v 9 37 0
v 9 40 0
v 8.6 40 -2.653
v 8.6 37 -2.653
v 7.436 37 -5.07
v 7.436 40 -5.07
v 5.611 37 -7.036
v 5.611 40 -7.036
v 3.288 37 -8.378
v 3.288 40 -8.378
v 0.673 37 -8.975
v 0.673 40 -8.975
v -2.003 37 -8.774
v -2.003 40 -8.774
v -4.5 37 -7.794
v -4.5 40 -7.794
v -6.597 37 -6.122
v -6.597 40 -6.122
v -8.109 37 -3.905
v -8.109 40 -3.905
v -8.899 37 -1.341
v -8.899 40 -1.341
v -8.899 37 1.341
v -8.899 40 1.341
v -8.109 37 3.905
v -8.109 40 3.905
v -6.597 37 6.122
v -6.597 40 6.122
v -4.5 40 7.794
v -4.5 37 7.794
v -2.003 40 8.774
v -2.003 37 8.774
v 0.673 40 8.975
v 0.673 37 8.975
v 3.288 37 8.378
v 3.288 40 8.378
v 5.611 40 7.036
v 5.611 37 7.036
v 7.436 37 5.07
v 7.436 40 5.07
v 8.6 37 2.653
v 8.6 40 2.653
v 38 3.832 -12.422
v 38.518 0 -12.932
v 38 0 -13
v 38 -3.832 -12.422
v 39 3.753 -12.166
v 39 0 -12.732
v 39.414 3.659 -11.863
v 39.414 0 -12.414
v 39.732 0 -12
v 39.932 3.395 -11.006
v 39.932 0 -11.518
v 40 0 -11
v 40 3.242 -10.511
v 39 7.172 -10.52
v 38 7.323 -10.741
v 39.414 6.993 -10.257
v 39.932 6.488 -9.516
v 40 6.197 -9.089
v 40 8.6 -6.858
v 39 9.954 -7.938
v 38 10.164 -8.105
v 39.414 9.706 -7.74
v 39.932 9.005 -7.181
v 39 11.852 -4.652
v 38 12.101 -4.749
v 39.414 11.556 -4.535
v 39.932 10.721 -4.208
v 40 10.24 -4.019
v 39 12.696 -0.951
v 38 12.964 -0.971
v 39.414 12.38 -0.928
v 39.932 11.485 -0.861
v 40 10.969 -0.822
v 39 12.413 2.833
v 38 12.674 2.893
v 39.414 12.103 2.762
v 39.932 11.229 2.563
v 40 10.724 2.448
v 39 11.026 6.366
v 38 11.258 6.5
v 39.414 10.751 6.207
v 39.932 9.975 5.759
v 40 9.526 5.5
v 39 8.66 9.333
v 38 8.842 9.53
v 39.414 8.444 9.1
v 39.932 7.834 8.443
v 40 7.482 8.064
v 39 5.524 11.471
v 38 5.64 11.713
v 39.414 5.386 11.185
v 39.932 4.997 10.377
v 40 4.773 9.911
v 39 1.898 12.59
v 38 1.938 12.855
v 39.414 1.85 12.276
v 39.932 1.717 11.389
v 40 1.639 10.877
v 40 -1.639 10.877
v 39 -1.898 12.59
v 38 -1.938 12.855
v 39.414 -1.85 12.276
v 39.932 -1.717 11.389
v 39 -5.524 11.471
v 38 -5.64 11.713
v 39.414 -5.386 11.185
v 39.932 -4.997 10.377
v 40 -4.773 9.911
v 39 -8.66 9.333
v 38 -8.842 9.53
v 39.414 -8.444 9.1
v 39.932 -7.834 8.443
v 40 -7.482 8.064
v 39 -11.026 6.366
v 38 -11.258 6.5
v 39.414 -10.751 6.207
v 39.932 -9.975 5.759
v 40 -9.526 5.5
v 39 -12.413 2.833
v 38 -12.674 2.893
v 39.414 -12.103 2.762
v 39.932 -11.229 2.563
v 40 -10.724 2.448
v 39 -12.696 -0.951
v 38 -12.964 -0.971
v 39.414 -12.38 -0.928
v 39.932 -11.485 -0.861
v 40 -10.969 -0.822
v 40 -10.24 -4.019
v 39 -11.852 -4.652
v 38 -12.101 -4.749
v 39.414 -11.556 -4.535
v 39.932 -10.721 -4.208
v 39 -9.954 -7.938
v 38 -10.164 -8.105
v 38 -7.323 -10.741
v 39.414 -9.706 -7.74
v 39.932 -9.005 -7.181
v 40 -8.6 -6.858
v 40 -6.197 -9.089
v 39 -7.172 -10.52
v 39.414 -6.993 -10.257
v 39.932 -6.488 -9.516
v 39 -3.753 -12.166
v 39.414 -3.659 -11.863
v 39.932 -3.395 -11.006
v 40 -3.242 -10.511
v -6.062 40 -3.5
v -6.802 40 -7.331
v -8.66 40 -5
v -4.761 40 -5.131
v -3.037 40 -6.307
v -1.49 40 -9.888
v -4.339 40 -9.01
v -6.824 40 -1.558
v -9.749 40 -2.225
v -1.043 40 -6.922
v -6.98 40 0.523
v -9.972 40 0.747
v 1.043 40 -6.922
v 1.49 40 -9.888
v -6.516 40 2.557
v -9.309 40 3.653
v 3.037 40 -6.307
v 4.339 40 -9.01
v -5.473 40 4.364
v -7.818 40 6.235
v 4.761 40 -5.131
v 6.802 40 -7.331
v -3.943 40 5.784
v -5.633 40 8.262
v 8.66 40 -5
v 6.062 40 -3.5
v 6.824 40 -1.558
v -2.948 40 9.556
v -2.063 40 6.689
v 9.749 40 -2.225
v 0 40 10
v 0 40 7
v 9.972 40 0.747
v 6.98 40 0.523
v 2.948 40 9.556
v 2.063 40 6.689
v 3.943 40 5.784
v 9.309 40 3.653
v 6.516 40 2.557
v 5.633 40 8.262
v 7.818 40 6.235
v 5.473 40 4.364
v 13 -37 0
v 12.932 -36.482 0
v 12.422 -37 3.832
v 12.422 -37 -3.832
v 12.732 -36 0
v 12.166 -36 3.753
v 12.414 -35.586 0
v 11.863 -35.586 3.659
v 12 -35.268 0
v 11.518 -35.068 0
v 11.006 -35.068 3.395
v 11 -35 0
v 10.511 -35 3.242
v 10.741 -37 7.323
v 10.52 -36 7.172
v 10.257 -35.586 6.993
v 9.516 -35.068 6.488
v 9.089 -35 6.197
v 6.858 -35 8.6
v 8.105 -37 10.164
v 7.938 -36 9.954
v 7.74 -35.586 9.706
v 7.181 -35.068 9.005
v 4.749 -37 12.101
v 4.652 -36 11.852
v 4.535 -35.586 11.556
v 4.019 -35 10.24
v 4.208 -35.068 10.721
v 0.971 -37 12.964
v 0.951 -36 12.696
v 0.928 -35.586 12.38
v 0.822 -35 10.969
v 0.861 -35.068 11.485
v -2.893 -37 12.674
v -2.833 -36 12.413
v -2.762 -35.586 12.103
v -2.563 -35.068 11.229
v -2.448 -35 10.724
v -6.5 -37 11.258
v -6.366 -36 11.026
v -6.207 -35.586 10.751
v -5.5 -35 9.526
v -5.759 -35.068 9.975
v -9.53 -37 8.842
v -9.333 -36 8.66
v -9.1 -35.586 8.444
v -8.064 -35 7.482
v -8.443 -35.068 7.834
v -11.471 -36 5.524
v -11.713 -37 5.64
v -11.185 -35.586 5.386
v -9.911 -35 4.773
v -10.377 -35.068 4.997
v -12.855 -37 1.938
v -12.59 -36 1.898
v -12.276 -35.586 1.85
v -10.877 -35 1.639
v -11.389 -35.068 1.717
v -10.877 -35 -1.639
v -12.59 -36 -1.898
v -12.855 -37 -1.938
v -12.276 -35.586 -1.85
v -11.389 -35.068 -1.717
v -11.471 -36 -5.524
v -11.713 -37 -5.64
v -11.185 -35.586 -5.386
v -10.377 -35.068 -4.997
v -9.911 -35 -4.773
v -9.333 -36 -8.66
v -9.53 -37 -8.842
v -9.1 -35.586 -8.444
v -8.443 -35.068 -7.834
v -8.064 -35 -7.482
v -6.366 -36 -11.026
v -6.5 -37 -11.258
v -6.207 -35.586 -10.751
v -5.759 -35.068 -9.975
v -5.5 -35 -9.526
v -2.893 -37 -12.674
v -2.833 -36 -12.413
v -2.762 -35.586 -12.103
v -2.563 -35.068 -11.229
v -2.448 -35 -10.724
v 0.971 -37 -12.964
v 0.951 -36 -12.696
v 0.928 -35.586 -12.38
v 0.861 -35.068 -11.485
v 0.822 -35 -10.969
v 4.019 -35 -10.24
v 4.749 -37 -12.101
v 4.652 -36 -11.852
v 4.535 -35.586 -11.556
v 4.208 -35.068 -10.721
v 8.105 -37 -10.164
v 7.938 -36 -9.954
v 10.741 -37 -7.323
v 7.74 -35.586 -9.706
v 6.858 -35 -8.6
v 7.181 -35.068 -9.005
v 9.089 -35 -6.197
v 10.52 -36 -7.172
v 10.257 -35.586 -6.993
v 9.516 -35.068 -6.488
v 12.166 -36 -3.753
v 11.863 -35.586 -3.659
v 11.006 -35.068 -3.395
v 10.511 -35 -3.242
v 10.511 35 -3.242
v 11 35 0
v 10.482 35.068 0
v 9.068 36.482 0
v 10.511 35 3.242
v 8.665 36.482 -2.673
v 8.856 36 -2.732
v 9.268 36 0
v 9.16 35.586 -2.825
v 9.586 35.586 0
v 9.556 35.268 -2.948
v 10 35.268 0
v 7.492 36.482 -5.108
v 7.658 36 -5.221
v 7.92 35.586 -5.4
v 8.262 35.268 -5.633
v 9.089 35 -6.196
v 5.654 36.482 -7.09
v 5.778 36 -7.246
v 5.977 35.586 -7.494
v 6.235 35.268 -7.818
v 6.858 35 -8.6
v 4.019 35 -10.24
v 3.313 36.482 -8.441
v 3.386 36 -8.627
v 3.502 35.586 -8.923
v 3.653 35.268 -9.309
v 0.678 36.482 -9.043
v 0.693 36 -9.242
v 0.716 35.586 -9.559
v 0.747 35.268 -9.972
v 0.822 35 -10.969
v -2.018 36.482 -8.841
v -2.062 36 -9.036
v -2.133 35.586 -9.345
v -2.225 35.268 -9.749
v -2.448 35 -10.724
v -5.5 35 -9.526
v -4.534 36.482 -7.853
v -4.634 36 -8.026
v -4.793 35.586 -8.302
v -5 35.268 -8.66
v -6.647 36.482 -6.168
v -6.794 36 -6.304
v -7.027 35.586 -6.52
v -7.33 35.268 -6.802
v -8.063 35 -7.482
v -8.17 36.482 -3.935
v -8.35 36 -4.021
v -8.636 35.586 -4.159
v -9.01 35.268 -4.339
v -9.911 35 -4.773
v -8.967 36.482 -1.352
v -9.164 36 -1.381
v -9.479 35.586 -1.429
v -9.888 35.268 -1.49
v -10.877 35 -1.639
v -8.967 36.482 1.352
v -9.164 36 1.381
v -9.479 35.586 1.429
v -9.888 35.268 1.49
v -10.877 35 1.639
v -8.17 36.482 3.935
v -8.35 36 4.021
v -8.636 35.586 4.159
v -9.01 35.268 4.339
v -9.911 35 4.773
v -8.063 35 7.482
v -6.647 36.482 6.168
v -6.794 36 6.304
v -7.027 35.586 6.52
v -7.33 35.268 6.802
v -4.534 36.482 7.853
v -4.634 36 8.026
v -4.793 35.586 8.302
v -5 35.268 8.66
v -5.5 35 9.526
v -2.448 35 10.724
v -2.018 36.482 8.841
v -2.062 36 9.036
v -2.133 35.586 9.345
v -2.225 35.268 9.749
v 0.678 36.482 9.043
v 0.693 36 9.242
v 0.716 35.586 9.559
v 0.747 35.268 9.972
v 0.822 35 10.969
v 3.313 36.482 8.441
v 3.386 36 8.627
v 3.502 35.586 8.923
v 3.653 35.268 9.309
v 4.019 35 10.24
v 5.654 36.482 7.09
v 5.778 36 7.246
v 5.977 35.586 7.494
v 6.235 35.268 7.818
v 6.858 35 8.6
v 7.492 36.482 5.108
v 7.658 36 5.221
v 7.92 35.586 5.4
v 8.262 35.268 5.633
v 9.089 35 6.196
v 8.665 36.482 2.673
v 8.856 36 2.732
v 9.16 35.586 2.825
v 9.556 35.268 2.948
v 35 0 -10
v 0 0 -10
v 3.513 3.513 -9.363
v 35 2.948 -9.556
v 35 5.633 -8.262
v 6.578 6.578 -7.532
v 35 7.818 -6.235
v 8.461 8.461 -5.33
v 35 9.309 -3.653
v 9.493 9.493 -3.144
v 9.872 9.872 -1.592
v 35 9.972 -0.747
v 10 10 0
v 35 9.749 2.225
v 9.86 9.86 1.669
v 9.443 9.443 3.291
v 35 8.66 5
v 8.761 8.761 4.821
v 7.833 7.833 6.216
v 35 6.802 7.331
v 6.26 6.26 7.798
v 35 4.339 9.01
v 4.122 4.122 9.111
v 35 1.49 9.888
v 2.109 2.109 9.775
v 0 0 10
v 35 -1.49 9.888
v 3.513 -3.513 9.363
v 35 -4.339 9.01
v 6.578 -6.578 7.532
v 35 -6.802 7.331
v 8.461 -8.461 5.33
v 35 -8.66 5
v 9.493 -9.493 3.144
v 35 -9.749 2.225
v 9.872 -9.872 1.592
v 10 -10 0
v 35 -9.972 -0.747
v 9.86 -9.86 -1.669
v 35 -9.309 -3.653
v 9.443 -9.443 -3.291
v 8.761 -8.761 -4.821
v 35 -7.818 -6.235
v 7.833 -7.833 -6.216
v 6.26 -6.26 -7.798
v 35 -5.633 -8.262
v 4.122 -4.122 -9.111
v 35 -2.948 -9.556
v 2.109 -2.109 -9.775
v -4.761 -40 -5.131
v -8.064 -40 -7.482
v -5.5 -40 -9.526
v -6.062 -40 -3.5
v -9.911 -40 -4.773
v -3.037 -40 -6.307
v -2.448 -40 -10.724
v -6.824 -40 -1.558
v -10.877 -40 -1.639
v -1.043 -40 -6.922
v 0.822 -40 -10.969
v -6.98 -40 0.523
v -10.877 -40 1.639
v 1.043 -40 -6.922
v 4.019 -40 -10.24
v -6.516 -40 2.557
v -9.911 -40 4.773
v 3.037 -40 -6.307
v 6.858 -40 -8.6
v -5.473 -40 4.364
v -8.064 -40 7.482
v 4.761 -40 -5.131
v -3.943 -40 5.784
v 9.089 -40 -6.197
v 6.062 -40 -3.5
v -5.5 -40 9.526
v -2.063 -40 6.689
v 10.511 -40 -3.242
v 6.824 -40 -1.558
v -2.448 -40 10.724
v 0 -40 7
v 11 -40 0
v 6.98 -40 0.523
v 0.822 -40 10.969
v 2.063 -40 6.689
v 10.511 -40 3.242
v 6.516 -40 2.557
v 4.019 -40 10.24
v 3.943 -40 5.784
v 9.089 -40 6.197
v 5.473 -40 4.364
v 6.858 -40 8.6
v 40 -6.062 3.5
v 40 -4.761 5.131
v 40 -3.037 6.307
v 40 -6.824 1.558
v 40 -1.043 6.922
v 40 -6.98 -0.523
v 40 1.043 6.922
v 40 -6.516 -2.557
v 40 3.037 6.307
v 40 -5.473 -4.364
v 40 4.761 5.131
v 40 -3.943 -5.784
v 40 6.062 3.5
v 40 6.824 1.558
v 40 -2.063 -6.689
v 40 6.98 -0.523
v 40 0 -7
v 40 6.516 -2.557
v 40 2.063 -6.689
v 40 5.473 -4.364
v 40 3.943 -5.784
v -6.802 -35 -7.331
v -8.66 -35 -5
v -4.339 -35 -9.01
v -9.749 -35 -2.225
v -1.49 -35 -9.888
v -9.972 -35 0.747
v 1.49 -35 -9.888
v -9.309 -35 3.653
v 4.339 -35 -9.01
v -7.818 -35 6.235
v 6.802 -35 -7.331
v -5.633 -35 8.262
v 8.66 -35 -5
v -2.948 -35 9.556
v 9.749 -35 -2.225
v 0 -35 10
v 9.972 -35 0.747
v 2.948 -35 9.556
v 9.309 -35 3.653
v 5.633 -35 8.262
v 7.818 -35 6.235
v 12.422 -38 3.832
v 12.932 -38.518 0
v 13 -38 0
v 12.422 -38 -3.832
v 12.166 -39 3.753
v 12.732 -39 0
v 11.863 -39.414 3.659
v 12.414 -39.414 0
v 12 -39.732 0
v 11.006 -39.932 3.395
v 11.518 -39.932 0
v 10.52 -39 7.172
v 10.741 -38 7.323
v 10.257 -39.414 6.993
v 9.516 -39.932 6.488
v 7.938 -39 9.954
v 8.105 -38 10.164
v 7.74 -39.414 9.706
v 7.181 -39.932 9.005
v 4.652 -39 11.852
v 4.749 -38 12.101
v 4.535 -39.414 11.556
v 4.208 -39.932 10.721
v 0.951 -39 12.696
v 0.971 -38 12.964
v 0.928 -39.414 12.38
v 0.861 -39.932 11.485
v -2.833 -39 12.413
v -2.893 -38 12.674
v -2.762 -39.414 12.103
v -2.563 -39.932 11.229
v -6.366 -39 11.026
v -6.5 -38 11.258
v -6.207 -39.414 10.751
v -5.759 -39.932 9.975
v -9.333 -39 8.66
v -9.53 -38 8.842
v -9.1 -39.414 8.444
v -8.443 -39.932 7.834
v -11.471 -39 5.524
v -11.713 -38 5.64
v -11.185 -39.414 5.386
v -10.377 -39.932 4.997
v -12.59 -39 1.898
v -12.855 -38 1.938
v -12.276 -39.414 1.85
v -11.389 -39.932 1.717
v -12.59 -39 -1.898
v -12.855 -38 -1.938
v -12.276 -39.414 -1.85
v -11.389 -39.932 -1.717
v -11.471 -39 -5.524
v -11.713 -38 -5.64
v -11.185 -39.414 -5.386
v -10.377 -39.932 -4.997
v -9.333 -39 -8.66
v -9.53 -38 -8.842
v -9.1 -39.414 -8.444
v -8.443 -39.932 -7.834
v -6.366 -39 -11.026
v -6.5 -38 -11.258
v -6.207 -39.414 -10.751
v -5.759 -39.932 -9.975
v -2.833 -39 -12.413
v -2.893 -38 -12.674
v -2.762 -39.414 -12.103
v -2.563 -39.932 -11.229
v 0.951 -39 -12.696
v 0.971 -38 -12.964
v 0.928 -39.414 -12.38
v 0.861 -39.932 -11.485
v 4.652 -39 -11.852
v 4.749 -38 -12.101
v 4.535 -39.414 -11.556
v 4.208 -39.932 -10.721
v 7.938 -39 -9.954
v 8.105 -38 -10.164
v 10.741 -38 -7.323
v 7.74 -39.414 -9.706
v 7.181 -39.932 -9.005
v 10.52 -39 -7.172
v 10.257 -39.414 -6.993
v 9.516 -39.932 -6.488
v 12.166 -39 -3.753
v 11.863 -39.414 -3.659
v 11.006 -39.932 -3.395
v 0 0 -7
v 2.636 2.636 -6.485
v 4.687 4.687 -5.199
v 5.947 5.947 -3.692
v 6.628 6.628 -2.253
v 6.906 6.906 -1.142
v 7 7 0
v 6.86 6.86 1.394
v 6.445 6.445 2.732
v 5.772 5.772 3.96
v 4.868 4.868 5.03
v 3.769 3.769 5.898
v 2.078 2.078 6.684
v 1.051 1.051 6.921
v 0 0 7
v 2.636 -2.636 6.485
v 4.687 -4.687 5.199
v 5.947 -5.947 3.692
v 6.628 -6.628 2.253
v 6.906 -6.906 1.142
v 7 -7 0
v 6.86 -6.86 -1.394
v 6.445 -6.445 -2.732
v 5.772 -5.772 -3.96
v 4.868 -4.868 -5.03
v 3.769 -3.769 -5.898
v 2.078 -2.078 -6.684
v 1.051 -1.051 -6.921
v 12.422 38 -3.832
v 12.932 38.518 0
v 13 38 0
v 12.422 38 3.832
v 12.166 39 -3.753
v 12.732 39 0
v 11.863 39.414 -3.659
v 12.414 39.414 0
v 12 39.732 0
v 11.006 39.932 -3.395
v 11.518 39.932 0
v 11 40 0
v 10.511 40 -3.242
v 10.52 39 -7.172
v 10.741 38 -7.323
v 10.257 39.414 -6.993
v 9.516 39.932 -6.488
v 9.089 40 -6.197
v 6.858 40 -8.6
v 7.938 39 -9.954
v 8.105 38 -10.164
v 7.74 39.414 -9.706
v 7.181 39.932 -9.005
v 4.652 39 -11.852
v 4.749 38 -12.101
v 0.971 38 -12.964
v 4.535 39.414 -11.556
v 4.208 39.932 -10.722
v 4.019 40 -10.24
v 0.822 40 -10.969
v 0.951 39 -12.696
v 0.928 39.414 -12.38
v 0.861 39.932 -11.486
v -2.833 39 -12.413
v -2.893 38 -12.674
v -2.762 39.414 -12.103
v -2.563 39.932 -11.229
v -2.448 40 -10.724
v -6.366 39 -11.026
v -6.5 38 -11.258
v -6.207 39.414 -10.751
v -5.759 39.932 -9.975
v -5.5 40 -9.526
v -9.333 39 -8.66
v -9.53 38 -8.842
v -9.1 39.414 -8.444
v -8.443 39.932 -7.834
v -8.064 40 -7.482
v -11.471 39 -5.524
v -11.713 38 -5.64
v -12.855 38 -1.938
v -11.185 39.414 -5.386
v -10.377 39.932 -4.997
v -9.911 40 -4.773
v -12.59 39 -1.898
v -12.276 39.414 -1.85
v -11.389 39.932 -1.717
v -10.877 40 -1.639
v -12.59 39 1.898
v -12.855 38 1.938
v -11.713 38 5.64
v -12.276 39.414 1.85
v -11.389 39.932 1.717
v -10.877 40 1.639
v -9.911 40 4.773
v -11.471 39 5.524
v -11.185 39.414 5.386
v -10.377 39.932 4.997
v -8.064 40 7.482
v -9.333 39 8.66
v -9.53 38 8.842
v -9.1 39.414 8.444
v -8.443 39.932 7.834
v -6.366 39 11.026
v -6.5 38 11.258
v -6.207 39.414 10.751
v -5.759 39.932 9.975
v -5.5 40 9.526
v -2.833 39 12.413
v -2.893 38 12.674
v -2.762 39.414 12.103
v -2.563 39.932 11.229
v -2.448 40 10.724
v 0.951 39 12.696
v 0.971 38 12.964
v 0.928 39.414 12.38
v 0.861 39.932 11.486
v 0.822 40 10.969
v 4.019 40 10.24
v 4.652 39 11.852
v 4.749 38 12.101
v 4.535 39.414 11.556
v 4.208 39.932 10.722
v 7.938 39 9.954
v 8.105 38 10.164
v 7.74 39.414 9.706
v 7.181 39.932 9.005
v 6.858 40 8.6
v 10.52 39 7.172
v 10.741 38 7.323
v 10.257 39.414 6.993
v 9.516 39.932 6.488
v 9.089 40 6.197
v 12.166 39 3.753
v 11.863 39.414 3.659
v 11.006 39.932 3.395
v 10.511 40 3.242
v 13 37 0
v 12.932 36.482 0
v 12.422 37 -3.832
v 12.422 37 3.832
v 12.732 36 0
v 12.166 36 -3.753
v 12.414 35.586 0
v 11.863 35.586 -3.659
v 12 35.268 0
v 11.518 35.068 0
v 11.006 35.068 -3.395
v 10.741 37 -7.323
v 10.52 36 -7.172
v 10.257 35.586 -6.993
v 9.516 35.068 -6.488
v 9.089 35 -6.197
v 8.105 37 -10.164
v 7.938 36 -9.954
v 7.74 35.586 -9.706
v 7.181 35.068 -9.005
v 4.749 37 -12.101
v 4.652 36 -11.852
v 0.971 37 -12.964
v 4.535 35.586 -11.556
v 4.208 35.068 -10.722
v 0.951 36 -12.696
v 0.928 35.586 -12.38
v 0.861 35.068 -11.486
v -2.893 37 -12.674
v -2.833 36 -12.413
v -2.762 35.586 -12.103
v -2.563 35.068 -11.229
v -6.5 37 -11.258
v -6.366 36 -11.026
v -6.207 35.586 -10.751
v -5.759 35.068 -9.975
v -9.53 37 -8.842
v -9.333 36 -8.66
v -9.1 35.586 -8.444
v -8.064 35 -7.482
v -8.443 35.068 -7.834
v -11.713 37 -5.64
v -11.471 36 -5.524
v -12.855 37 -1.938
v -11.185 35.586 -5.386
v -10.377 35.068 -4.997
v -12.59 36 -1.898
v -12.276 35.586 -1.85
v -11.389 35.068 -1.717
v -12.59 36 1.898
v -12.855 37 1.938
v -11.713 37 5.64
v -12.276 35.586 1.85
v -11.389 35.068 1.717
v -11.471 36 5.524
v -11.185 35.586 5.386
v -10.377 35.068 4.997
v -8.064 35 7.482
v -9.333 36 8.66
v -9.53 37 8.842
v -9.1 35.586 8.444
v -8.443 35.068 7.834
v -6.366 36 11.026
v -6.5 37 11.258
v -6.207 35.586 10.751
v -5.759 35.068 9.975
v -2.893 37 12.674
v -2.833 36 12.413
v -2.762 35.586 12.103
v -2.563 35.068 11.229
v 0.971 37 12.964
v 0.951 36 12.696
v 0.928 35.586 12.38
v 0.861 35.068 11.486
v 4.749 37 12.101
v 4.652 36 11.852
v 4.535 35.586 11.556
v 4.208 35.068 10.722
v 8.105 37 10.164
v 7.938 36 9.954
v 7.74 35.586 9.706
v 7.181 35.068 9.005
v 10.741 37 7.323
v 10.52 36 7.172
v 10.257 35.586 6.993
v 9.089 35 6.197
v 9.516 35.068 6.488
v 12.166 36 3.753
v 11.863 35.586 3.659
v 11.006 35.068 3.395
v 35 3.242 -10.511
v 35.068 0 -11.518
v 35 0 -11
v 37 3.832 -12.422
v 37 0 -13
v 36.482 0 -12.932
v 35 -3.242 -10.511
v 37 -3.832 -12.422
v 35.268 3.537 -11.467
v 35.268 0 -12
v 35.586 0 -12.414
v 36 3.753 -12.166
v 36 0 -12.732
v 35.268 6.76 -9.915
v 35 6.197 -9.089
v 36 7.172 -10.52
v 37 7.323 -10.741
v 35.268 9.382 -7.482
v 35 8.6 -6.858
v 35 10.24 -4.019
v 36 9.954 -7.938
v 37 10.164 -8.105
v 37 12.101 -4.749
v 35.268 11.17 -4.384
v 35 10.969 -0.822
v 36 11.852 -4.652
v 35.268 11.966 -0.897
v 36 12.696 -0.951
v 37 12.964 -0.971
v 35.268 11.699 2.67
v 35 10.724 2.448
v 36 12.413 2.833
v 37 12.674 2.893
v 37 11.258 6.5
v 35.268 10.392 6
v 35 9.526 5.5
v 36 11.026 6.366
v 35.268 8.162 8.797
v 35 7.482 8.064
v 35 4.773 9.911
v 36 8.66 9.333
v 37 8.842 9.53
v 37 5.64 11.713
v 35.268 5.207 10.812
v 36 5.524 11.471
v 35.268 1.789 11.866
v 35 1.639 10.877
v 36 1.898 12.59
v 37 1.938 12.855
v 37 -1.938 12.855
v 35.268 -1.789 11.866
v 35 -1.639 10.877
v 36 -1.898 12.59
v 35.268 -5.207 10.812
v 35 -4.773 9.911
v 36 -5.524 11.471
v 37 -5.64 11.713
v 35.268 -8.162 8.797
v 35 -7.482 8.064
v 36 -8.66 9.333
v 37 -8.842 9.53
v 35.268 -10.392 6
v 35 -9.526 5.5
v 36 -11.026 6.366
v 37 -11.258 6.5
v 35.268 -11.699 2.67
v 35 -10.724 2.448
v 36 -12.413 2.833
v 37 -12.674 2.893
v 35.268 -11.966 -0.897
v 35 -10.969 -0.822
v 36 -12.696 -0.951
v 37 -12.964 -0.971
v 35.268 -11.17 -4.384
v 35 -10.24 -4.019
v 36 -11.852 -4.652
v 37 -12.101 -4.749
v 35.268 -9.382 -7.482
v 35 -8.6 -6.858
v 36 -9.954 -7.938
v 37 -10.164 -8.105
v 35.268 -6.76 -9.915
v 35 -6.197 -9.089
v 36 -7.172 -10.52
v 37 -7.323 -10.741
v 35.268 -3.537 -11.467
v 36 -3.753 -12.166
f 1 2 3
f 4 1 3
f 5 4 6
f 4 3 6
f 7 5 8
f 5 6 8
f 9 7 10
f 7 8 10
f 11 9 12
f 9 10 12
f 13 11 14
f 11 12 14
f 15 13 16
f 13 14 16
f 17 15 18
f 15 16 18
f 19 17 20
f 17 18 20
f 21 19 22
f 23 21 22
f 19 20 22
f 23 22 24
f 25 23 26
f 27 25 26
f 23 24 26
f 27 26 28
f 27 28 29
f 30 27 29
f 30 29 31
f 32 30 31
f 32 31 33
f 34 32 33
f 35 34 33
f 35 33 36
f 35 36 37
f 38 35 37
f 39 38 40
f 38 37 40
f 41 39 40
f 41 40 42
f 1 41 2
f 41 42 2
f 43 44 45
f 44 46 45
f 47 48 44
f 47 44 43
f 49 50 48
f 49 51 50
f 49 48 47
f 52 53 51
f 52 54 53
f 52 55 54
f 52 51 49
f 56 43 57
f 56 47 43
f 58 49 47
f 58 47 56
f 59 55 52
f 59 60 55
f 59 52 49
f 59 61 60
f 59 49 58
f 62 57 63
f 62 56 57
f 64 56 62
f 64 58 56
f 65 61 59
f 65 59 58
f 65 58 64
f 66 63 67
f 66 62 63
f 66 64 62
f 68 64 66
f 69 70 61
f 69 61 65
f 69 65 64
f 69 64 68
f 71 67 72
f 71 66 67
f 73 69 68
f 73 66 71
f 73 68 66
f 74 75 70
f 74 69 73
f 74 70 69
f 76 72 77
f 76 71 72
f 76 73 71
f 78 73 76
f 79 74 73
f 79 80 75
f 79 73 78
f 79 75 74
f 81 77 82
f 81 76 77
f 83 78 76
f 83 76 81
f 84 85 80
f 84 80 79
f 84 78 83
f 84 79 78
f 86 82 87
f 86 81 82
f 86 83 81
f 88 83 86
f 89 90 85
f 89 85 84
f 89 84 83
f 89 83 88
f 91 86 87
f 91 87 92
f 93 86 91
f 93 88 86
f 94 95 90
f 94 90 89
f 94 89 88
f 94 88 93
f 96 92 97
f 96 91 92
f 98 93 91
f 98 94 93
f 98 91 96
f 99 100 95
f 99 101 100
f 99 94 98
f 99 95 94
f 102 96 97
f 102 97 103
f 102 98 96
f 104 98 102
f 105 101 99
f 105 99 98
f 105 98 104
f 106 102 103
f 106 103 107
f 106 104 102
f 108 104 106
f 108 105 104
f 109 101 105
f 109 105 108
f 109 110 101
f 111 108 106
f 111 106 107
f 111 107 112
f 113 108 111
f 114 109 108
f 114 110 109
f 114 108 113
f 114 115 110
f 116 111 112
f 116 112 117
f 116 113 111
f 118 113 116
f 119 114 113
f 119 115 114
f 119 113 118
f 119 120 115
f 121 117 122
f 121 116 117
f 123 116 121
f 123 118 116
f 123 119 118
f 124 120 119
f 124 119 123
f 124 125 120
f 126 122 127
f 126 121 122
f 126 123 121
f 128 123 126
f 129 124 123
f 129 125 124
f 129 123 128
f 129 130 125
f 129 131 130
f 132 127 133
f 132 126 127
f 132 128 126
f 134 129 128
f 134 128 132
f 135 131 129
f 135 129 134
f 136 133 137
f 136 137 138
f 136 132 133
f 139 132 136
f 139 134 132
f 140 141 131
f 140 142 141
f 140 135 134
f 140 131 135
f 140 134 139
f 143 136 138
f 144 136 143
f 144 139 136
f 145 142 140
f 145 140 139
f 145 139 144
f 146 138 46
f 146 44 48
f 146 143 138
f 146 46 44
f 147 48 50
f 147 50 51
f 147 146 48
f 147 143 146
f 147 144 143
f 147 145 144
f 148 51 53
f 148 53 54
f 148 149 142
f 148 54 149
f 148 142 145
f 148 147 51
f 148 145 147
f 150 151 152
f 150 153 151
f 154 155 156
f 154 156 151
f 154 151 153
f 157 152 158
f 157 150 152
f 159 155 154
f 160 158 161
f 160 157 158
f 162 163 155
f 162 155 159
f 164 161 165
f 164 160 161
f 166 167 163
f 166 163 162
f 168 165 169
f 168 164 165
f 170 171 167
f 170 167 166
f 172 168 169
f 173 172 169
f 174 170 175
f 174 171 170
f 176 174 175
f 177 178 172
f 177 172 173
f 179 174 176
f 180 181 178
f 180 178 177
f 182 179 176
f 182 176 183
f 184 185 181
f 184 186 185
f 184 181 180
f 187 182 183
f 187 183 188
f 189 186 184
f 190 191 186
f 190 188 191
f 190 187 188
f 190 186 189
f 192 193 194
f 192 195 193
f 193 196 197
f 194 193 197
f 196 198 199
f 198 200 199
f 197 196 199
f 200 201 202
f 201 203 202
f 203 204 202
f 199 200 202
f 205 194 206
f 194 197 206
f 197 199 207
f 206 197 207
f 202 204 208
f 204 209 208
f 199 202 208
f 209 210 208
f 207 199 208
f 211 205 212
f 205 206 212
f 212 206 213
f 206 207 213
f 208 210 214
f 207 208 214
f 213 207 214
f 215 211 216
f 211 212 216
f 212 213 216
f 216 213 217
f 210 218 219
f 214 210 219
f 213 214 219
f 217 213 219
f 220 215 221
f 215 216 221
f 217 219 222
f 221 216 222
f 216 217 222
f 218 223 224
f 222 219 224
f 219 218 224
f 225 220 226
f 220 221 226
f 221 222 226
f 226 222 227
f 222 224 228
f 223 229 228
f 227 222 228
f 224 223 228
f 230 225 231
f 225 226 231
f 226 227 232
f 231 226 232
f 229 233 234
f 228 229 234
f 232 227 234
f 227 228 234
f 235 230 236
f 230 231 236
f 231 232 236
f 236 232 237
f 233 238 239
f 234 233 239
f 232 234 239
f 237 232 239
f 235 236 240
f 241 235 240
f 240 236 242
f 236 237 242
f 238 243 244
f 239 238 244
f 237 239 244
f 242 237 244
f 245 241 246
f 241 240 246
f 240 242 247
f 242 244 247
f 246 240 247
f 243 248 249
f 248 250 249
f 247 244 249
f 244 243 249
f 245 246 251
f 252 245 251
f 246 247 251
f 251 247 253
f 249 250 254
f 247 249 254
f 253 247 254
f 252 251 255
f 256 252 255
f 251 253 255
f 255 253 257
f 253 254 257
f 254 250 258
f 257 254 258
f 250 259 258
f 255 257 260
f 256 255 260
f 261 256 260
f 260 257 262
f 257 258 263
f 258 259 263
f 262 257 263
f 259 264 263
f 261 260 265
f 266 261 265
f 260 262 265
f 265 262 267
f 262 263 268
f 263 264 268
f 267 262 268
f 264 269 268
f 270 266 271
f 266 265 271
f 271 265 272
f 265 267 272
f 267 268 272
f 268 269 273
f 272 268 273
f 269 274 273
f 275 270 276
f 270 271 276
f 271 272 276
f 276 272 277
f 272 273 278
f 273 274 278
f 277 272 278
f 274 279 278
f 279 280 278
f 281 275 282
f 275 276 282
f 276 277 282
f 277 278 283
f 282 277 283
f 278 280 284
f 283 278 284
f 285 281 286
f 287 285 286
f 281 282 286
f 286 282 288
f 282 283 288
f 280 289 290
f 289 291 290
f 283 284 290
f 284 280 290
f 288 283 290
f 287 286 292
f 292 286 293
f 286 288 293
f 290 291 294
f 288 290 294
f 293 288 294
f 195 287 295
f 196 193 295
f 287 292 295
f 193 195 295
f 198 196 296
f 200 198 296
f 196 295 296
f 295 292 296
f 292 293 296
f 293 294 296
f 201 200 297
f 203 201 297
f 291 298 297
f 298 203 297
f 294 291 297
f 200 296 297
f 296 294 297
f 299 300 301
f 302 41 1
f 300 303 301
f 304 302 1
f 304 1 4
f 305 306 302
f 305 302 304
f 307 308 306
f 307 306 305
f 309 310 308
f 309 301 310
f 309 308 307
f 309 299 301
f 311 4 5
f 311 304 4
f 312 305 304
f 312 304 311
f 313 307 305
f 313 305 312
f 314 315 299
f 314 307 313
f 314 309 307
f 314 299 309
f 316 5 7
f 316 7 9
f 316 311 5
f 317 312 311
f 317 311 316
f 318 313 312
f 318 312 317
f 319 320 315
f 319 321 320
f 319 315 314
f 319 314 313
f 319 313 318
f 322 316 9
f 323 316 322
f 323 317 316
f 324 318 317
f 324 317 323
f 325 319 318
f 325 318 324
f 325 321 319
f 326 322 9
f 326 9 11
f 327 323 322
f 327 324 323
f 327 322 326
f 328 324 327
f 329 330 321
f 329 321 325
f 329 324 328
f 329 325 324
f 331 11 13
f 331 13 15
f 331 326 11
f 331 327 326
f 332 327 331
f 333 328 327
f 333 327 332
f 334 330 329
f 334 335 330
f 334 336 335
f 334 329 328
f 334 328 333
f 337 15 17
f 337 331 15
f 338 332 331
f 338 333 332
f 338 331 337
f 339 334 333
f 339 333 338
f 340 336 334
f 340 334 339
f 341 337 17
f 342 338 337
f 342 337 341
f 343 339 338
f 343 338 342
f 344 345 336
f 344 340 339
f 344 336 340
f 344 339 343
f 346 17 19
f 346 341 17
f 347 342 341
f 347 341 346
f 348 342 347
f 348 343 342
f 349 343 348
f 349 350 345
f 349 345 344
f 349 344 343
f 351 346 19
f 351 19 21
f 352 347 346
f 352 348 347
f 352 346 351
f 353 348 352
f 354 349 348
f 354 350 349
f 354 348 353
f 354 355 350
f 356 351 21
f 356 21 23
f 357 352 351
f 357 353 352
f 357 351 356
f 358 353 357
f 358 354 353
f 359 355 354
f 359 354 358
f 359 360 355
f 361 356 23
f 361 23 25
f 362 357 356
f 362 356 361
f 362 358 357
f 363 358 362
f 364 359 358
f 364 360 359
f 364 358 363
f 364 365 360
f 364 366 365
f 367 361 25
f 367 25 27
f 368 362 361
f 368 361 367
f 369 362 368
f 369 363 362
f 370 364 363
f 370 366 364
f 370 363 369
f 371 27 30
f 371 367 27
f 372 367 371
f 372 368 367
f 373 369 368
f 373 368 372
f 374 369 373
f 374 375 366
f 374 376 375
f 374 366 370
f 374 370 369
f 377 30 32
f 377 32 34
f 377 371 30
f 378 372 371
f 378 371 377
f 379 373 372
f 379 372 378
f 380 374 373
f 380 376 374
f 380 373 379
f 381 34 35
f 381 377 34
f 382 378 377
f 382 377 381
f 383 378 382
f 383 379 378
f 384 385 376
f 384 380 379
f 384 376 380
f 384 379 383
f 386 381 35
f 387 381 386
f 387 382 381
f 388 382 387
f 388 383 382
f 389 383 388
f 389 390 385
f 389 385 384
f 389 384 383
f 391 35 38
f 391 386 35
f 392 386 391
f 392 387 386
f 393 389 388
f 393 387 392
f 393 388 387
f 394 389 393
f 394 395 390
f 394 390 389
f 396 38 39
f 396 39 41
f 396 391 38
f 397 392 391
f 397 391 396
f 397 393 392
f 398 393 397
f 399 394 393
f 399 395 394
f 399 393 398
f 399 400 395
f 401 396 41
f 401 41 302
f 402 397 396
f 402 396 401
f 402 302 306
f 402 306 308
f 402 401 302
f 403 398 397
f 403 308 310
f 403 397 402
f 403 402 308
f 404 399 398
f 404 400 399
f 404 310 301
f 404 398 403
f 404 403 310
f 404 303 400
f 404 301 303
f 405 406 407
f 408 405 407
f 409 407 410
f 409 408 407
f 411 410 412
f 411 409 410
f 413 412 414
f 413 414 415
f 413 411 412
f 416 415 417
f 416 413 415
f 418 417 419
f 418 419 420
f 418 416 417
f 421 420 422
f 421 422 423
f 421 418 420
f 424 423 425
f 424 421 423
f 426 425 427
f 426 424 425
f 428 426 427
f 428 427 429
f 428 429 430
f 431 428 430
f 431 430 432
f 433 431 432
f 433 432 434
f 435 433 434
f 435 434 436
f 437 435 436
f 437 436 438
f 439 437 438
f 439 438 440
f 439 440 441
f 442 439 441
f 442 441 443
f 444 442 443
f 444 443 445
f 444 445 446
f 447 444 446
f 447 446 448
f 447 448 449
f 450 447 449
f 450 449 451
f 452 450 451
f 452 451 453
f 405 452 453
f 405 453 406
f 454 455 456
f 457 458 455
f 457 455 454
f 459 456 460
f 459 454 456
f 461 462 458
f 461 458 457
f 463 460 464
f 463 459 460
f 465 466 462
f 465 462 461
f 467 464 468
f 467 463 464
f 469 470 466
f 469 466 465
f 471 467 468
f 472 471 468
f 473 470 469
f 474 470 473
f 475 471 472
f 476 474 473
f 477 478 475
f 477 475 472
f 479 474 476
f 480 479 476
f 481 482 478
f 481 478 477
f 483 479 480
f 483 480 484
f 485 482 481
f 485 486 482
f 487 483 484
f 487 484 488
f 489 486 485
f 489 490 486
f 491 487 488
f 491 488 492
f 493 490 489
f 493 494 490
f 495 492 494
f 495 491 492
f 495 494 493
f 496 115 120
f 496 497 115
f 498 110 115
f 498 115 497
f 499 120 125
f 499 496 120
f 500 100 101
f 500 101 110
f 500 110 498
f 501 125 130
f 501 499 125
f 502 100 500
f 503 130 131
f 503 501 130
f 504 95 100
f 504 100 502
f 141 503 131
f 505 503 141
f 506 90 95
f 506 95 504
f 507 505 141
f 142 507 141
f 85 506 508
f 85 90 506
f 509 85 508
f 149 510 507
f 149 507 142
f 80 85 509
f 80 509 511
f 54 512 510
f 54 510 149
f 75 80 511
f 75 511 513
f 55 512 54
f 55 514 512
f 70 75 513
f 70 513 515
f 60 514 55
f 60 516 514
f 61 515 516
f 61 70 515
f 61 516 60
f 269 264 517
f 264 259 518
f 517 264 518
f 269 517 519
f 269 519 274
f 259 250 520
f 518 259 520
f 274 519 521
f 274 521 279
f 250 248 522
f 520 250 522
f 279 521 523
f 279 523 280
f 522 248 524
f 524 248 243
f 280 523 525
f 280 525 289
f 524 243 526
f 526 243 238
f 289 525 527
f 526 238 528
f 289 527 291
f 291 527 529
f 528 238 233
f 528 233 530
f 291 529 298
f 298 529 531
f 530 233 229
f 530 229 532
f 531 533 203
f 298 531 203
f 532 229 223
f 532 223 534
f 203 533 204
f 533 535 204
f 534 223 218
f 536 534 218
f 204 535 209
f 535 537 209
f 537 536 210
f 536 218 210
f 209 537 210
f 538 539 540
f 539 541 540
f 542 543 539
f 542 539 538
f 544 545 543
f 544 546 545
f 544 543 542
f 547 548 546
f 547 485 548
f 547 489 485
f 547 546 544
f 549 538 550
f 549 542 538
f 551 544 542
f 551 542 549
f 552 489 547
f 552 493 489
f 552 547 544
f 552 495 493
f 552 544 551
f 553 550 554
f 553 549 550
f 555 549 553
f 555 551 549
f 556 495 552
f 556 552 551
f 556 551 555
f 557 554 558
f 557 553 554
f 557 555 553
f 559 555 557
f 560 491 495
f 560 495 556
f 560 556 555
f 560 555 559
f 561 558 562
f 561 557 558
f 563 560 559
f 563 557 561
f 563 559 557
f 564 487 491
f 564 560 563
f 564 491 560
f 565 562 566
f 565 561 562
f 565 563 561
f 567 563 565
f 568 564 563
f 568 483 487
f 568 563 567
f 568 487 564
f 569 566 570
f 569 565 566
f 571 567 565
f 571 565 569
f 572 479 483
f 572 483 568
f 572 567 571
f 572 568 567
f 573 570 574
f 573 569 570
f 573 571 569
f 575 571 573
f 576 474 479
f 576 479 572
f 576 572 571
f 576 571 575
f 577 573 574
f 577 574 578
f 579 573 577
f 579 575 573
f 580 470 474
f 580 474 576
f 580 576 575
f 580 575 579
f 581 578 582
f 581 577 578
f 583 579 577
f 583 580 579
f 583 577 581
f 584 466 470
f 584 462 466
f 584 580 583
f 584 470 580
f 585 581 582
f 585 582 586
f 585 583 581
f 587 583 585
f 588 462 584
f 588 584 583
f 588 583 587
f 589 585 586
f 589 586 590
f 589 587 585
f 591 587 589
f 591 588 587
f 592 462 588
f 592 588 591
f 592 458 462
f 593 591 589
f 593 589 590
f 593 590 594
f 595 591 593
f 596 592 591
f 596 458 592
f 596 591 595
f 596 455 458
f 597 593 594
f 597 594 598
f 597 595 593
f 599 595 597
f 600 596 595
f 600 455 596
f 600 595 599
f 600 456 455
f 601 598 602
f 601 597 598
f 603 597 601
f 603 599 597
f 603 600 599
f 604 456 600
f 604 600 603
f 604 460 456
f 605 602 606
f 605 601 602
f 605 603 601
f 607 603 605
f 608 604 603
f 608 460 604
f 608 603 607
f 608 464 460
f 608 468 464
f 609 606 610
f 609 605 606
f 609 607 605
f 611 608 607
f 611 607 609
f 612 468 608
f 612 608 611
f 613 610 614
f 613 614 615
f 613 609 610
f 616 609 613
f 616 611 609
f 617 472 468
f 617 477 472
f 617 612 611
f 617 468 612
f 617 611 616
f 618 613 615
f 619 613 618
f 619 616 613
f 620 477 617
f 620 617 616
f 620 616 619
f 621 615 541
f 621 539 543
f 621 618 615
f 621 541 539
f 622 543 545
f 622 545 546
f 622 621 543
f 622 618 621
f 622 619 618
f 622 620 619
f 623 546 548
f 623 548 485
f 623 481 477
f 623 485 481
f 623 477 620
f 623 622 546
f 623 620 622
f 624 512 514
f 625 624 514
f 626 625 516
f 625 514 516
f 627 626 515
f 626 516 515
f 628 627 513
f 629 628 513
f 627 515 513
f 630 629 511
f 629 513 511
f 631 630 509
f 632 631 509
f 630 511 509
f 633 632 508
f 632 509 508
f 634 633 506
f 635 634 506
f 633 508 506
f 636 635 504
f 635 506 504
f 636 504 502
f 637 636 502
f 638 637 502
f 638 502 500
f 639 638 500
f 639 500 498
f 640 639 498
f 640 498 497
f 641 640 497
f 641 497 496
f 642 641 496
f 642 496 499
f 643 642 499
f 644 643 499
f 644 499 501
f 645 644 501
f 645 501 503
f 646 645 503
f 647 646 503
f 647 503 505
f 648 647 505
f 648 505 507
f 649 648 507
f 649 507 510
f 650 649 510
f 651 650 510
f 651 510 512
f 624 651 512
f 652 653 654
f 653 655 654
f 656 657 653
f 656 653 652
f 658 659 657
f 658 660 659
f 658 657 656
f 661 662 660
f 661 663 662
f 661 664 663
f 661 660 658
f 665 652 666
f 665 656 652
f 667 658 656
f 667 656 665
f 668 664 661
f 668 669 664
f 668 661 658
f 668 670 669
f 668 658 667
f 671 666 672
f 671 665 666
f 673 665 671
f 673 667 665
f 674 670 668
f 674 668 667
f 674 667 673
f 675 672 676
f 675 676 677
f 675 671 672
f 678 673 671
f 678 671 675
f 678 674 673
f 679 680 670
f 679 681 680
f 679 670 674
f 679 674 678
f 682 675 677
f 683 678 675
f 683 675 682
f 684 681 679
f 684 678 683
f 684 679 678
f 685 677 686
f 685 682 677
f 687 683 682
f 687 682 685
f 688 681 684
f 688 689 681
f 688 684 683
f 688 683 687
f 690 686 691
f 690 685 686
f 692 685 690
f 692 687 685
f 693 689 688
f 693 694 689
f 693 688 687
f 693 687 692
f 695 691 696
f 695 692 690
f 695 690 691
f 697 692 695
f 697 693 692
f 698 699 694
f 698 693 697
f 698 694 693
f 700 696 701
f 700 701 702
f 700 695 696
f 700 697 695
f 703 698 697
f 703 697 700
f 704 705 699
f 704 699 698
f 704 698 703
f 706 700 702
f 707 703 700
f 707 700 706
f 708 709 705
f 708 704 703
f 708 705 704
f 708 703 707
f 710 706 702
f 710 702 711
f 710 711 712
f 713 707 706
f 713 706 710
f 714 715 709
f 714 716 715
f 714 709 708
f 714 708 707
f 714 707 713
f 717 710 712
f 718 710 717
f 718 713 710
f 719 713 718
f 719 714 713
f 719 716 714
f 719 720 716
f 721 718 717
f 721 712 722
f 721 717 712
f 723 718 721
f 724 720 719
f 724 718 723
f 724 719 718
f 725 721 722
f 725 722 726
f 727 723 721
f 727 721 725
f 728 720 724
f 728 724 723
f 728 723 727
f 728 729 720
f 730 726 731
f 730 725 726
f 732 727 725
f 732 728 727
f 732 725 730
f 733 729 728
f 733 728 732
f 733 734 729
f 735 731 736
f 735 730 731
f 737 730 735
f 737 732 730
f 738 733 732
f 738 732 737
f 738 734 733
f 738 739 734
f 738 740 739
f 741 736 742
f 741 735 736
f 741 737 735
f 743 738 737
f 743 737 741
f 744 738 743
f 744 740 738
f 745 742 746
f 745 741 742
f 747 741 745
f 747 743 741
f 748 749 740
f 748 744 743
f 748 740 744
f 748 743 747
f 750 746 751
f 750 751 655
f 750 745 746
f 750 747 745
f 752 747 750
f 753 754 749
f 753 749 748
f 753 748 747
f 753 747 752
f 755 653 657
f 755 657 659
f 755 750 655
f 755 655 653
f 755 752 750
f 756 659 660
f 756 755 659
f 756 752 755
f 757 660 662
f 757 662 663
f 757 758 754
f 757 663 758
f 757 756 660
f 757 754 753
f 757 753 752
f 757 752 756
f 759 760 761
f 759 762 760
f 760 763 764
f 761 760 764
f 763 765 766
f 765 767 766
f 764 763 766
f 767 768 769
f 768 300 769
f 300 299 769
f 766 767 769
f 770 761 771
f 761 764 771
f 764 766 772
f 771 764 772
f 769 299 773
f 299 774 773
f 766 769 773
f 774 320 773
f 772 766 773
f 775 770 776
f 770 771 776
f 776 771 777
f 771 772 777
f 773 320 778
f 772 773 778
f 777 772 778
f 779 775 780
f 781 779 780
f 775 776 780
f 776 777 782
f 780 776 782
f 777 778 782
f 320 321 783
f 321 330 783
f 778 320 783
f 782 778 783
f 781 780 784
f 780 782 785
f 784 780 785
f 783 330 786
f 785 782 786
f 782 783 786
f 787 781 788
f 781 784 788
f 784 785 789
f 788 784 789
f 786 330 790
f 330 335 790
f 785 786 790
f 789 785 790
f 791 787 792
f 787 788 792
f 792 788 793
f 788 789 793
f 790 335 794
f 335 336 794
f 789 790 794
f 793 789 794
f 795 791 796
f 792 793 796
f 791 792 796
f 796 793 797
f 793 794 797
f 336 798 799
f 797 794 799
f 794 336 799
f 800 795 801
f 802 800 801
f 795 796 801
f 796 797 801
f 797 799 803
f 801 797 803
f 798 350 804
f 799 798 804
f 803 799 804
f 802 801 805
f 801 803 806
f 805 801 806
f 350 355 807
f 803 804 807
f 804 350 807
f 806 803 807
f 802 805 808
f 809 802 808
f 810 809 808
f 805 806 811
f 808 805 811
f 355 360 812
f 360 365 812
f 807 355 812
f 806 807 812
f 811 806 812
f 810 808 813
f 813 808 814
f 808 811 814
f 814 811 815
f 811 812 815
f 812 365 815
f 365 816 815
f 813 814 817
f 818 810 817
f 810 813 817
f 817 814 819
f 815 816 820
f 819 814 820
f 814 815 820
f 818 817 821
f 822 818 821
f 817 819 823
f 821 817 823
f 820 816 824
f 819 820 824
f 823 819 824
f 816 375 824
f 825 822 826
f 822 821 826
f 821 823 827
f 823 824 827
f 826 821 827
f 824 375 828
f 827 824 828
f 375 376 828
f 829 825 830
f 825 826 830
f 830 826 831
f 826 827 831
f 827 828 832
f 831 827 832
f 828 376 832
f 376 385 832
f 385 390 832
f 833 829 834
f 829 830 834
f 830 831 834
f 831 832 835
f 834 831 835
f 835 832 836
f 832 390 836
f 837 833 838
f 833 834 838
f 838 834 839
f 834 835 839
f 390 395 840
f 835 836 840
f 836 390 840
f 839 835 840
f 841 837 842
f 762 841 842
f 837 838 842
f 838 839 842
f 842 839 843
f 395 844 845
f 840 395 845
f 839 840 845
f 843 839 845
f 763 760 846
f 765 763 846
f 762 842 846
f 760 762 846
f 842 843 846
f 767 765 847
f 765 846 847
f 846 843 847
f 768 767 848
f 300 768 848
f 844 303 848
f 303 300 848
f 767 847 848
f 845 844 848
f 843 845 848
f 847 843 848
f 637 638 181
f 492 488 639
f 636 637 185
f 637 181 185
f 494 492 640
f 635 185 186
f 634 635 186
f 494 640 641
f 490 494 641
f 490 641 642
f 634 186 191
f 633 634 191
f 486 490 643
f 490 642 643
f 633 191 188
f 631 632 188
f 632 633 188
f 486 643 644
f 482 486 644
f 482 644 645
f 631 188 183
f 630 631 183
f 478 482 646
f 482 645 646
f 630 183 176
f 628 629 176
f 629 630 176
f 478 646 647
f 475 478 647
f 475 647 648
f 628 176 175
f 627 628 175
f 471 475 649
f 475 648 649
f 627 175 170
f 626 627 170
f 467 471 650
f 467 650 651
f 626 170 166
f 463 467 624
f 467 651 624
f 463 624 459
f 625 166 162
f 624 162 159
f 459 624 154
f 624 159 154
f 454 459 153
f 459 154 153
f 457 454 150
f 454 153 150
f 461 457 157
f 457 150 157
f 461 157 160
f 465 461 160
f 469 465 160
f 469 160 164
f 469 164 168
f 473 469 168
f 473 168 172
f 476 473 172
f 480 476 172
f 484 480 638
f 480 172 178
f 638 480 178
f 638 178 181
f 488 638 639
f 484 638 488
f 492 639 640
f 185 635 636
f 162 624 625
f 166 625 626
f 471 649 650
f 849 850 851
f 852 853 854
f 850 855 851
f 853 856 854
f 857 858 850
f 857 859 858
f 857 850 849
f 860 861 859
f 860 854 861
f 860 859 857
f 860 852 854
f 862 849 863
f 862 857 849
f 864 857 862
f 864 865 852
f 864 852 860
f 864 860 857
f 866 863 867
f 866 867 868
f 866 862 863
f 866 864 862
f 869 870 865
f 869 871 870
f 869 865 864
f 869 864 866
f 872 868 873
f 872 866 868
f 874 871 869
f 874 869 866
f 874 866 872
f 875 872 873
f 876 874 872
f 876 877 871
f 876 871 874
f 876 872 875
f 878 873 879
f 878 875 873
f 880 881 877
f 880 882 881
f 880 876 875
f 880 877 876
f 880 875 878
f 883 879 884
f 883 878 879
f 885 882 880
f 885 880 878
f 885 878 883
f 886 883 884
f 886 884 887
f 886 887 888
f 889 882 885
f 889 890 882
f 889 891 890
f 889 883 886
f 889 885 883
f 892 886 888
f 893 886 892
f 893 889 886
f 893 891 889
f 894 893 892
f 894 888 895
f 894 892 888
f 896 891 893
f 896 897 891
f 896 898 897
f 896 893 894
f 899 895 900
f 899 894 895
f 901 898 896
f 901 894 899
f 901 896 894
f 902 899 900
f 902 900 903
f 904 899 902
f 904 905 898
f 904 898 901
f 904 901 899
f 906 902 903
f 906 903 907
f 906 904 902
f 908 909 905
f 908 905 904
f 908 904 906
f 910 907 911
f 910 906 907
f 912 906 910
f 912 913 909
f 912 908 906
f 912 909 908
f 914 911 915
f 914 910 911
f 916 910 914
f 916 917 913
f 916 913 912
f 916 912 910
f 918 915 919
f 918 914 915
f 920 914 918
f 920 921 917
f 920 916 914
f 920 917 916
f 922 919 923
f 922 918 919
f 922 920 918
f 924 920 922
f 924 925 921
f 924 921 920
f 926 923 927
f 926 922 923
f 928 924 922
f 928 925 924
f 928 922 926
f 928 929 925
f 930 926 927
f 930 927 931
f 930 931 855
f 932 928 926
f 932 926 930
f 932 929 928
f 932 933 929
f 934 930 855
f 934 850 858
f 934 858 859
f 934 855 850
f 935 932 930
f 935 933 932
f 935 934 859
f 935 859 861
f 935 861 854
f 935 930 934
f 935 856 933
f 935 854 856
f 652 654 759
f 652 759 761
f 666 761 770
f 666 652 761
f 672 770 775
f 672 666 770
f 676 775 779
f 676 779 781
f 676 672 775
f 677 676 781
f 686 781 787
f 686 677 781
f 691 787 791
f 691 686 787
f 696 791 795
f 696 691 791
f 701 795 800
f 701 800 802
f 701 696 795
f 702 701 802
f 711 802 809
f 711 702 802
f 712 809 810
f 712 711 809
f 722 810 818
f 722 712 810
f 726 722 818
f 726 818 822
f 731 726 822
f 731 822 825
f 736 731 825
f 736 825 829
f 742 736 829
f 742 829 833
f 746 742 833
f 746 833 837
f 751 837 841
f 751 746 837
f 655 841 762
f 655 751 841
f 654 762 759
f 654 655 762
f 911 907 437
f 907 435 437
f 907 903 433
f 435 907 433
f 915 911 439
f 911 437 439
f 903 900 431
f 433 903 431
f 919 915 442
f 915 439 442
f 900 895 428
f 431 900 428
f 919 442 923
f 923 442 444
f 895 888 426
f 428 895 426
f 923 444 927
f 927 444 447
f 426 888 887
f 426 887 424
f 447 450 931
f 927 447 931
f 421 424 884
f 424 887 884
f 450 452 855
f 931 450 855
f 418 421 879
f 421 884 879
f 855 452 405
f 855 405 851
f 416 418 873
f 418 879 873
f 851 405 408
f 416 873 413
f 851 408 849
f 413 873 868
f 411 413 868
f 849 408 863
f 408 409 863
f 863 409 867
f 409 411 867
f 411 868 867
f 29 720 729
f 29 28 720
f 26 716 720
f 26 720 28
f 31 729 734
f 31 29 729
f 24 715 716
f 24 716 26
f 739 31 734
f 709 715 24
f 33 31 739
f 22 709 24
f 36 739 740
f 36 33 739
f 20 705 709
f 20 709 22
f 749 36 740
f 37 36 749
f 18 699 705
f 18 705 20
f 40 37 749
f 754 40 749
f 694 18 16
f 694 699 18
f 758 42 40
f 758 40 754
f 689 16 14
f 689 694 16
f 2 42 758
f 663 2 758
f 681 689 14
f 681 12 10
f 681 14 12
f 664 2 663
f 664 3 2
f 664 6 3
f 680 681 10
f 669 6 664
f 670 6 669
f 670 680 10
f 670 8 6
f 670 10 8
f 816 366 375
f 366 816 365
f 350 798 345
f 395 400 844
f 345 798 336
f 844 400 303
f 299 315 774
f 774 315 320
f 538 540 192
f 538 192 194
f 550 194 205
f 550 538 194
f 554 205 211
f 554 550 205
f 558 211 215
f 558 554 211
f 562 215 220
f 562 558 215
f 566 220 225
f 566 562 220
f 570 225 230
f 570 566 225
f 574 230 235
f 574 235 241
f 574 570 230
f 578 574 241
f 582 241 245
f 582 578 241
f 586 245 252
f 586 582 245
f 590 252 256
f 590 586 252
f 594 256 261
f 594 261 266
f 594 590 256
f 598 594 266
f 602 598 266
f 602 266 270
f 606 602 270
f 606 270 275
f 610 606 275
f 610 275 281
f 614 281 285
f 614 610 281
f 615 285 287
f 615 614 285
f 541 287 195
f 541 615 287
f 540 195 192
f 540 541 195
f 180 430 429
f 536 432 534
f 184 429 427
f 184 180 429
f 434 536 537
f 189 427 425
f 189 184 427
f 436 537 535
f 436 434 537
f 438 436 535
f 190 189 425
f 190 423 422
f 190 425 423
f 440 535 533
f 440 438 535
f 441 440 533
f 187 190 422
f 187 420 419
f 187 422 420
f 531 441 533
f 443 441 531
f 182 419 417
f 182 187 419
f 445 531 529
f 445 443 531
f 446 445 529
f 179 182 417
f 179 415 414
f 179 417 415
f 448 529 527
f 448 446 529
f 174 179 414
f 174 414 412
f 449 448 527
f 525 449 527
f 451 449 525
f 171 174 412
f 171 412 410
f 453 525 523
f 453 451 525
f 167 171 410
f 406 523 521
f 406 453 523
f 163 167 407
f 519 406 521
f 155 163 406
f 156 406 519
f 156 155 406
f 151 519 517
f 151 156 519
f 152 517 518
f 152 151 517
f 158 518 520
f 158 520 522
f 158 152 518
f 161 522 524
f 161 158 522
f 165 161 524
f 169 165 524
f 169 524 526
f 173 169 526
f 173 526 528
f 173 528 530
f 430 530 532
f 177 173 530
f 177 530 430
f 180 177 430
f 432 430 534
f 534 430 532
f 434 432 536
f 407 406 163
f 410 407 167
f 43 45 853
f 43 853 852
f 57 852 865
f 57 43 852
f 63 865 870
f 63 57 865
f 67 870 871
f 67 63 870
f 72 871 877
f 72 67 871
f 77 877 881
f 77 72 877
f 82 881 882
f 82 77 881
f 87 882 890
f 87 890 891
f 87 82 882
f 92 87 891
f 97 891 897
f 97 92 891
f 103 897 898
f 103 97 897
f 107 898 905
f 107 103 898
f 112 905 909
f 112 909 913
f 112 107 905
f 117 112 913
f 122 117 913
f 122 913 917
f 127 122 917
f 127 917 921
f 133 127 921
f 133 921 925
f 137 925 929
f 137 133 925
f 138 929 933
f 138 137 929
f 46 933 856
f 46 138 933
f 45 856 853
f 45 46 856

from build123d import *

# Parameters (mm, degrees)
SKETCH_1_R               = 10
EXTRUDE_1_DEPTH          = 40
SHELL_1_T                = -3
EXTRUDE_2_REACH          = 66.807
EXTRUDE_2_END_RADIUS     = 10
SKETCH_2_R               = 10
CUT_EXTRUDE_1_REACH      = 66.807
CUT_EXTRUDE_1_END_RADIUS = 7
SKETCH_3_R               = 7
SKETCH_5_R               = 13
SKETCH_5_R_2             = 9
EXTRUDE_2_2_DEPTH        = 5
SKETCH_6_R               = 13
SKETCH_6_R_2             = 9
EXTRUDE_3_DEPTH          = 5
SKETCH_7_R               = 13
SKETCH_7_R_2             = 9
EXTRUDE_4_DEPTH          = 5
FILLET_1_R               = 2
FILLET_2_R               = 2


with BuildPart() as part:
    # 草图1 → 凸台-拉伸1 (new, symmetric)
    with BuildSketch(Plane(origin=(0, 0, 0), x_dir=(1, 0, 0), z_dir=(0, 1, 0))):
        with Locations(Location((0, 0, 0), (0, 0, 270))):
            Circle(SKETCH_1_R)
    extrude(amount=EXTRUDE_1_DEPTH, both=True)

    # 抽壳1
    shell_1_openings = [part.faces().sort_by_distance(p)[0] for p in [
        (0, 40, 0),
        (0, -40, 0),
    ]]
    offset(amount=SHELL_1_T, openings=shell_1_openings, kind=Kind.INTERSECTION)

    # Extrude 2: up to this cylinder (the profile starts outside it)
    extrude_2_end = Plane(origin=(0, 0, 0), z_dir=(0, -1, 0)) * Cylinder(EXTRUDE_2_END_RADIUS, 154.614, mode=Mode.PRIVATE)
    # 草图2 → Extrude 2 (add, up to the surface)
    with BuildSketch(Plane(origin=(40, 0, 0), x_dir=(0, 0, -1), z_dir=(1, 0, 0)), mode=Mode.PRIVATE) as extrude_2_sk1:
        Circle(SKETCH_2_R)
    extrude_2_tool1 = extrude(extrude_2_sk1.sketch, amount=-EXTRUDE_2_REACH, mode=Mode.PRIVATE) - extrude_2_end
    add(extrude_2_tool1.solids().sort_by_distance((40, 0, 0))[0])

    # 切除-拉伸1: up to this cylinder (the profile starts outside it)
    cut_extrude_1_end = Plane(origin=(0, 0, 0), z_dir=(0, -1, 0)) * Cylinder(CUT_EXTRUDE_1_END_RADIUS, 148.614, mode=Mode.PRIVATE)
    # 草图3 → 切除-拉伸1 (cut, up to the surface)
    with BuildSketch(Plane(origin=(40, 0, 0), x_dir=(0, 0, -1), z_dir=(1, 0, 0)), mode=Mode.PRIVATE) as cut_extrude_1_sk1:
        Circle(SKETCH_3_R)
    cut_extrude_1_tool1 = extrude(cut_extrude_1_sk1.sketch, amount=-CUT_EXTRUDE_1_REACH, mode=Mode.PRIVATE) - cut_extrude_1_end
    add(cut_extrude_1_tool1.solids().sort_by_distance((40, 0, 0))[0], mode=Mode.SUBTRACT)

    # 草图6 → 拉伸-薄壁3 (add)
    with BuildSketch(Plane(origin=(40, 0, 0), x_dir=(0, 0, -1), z_dir=(1, 0, 0))):
        Circle(SKETCH_6_R)
        Circle(SKETCH_6_R_2, mode=Mode.SUBTRACT)
    extrude(amount=-EXTRUDE_3_DEPTH)

    # 草图7 → 拉伸-薄壁4 (add)
    with BuildSketch(Plane.XZ.offset(40)):
        Circle(SKETCH_7_R)
        Circle(SKETCH_7_R_2, mode=Mode.SUBTRACT)
    extrude(amount=-EXTRUDE_4_DEPTH)

    # 圆角1
    fillet_1_edges = [part.edges().sort_by_distance(p)[0] for p in [
        (35, 0, 13),
        (40, 0, 13),
        (-13, -35, 0),
        (-13, -40, 0),
    ]]
    fillet(fillet_1_edges, radius=FILLET_1_R)


with BuildPart() as body_2:
    # 草图5 → Extrude 2 2 (new body)
    with BuildSketch(Plane(origin=(0, 40, 0), x_dir=(1, 0, 0), z_dir=(0, 1, 0))):
        Circle(SKETCH_5_R)
        Circle(SKETCH_5_R_2, mode=Mode.SUBTRACT)
    extrude(amount=-EXTRUDE_2_2_DEPTH)

    # 圆角2
    fillet_2_edges = [body_2.edges().sort_by_distance(p)[0] for p in [
        (-13, 40, 0),
        (-13, 35, 0),
        (-9, 35, 0),
    ]]
    fillet(fillet_2_edges, radius=FILLET_2_R - 0.0001)  # a hair under: the kernel refuses the full size


solid = Compound([part.part, body_2.part])
